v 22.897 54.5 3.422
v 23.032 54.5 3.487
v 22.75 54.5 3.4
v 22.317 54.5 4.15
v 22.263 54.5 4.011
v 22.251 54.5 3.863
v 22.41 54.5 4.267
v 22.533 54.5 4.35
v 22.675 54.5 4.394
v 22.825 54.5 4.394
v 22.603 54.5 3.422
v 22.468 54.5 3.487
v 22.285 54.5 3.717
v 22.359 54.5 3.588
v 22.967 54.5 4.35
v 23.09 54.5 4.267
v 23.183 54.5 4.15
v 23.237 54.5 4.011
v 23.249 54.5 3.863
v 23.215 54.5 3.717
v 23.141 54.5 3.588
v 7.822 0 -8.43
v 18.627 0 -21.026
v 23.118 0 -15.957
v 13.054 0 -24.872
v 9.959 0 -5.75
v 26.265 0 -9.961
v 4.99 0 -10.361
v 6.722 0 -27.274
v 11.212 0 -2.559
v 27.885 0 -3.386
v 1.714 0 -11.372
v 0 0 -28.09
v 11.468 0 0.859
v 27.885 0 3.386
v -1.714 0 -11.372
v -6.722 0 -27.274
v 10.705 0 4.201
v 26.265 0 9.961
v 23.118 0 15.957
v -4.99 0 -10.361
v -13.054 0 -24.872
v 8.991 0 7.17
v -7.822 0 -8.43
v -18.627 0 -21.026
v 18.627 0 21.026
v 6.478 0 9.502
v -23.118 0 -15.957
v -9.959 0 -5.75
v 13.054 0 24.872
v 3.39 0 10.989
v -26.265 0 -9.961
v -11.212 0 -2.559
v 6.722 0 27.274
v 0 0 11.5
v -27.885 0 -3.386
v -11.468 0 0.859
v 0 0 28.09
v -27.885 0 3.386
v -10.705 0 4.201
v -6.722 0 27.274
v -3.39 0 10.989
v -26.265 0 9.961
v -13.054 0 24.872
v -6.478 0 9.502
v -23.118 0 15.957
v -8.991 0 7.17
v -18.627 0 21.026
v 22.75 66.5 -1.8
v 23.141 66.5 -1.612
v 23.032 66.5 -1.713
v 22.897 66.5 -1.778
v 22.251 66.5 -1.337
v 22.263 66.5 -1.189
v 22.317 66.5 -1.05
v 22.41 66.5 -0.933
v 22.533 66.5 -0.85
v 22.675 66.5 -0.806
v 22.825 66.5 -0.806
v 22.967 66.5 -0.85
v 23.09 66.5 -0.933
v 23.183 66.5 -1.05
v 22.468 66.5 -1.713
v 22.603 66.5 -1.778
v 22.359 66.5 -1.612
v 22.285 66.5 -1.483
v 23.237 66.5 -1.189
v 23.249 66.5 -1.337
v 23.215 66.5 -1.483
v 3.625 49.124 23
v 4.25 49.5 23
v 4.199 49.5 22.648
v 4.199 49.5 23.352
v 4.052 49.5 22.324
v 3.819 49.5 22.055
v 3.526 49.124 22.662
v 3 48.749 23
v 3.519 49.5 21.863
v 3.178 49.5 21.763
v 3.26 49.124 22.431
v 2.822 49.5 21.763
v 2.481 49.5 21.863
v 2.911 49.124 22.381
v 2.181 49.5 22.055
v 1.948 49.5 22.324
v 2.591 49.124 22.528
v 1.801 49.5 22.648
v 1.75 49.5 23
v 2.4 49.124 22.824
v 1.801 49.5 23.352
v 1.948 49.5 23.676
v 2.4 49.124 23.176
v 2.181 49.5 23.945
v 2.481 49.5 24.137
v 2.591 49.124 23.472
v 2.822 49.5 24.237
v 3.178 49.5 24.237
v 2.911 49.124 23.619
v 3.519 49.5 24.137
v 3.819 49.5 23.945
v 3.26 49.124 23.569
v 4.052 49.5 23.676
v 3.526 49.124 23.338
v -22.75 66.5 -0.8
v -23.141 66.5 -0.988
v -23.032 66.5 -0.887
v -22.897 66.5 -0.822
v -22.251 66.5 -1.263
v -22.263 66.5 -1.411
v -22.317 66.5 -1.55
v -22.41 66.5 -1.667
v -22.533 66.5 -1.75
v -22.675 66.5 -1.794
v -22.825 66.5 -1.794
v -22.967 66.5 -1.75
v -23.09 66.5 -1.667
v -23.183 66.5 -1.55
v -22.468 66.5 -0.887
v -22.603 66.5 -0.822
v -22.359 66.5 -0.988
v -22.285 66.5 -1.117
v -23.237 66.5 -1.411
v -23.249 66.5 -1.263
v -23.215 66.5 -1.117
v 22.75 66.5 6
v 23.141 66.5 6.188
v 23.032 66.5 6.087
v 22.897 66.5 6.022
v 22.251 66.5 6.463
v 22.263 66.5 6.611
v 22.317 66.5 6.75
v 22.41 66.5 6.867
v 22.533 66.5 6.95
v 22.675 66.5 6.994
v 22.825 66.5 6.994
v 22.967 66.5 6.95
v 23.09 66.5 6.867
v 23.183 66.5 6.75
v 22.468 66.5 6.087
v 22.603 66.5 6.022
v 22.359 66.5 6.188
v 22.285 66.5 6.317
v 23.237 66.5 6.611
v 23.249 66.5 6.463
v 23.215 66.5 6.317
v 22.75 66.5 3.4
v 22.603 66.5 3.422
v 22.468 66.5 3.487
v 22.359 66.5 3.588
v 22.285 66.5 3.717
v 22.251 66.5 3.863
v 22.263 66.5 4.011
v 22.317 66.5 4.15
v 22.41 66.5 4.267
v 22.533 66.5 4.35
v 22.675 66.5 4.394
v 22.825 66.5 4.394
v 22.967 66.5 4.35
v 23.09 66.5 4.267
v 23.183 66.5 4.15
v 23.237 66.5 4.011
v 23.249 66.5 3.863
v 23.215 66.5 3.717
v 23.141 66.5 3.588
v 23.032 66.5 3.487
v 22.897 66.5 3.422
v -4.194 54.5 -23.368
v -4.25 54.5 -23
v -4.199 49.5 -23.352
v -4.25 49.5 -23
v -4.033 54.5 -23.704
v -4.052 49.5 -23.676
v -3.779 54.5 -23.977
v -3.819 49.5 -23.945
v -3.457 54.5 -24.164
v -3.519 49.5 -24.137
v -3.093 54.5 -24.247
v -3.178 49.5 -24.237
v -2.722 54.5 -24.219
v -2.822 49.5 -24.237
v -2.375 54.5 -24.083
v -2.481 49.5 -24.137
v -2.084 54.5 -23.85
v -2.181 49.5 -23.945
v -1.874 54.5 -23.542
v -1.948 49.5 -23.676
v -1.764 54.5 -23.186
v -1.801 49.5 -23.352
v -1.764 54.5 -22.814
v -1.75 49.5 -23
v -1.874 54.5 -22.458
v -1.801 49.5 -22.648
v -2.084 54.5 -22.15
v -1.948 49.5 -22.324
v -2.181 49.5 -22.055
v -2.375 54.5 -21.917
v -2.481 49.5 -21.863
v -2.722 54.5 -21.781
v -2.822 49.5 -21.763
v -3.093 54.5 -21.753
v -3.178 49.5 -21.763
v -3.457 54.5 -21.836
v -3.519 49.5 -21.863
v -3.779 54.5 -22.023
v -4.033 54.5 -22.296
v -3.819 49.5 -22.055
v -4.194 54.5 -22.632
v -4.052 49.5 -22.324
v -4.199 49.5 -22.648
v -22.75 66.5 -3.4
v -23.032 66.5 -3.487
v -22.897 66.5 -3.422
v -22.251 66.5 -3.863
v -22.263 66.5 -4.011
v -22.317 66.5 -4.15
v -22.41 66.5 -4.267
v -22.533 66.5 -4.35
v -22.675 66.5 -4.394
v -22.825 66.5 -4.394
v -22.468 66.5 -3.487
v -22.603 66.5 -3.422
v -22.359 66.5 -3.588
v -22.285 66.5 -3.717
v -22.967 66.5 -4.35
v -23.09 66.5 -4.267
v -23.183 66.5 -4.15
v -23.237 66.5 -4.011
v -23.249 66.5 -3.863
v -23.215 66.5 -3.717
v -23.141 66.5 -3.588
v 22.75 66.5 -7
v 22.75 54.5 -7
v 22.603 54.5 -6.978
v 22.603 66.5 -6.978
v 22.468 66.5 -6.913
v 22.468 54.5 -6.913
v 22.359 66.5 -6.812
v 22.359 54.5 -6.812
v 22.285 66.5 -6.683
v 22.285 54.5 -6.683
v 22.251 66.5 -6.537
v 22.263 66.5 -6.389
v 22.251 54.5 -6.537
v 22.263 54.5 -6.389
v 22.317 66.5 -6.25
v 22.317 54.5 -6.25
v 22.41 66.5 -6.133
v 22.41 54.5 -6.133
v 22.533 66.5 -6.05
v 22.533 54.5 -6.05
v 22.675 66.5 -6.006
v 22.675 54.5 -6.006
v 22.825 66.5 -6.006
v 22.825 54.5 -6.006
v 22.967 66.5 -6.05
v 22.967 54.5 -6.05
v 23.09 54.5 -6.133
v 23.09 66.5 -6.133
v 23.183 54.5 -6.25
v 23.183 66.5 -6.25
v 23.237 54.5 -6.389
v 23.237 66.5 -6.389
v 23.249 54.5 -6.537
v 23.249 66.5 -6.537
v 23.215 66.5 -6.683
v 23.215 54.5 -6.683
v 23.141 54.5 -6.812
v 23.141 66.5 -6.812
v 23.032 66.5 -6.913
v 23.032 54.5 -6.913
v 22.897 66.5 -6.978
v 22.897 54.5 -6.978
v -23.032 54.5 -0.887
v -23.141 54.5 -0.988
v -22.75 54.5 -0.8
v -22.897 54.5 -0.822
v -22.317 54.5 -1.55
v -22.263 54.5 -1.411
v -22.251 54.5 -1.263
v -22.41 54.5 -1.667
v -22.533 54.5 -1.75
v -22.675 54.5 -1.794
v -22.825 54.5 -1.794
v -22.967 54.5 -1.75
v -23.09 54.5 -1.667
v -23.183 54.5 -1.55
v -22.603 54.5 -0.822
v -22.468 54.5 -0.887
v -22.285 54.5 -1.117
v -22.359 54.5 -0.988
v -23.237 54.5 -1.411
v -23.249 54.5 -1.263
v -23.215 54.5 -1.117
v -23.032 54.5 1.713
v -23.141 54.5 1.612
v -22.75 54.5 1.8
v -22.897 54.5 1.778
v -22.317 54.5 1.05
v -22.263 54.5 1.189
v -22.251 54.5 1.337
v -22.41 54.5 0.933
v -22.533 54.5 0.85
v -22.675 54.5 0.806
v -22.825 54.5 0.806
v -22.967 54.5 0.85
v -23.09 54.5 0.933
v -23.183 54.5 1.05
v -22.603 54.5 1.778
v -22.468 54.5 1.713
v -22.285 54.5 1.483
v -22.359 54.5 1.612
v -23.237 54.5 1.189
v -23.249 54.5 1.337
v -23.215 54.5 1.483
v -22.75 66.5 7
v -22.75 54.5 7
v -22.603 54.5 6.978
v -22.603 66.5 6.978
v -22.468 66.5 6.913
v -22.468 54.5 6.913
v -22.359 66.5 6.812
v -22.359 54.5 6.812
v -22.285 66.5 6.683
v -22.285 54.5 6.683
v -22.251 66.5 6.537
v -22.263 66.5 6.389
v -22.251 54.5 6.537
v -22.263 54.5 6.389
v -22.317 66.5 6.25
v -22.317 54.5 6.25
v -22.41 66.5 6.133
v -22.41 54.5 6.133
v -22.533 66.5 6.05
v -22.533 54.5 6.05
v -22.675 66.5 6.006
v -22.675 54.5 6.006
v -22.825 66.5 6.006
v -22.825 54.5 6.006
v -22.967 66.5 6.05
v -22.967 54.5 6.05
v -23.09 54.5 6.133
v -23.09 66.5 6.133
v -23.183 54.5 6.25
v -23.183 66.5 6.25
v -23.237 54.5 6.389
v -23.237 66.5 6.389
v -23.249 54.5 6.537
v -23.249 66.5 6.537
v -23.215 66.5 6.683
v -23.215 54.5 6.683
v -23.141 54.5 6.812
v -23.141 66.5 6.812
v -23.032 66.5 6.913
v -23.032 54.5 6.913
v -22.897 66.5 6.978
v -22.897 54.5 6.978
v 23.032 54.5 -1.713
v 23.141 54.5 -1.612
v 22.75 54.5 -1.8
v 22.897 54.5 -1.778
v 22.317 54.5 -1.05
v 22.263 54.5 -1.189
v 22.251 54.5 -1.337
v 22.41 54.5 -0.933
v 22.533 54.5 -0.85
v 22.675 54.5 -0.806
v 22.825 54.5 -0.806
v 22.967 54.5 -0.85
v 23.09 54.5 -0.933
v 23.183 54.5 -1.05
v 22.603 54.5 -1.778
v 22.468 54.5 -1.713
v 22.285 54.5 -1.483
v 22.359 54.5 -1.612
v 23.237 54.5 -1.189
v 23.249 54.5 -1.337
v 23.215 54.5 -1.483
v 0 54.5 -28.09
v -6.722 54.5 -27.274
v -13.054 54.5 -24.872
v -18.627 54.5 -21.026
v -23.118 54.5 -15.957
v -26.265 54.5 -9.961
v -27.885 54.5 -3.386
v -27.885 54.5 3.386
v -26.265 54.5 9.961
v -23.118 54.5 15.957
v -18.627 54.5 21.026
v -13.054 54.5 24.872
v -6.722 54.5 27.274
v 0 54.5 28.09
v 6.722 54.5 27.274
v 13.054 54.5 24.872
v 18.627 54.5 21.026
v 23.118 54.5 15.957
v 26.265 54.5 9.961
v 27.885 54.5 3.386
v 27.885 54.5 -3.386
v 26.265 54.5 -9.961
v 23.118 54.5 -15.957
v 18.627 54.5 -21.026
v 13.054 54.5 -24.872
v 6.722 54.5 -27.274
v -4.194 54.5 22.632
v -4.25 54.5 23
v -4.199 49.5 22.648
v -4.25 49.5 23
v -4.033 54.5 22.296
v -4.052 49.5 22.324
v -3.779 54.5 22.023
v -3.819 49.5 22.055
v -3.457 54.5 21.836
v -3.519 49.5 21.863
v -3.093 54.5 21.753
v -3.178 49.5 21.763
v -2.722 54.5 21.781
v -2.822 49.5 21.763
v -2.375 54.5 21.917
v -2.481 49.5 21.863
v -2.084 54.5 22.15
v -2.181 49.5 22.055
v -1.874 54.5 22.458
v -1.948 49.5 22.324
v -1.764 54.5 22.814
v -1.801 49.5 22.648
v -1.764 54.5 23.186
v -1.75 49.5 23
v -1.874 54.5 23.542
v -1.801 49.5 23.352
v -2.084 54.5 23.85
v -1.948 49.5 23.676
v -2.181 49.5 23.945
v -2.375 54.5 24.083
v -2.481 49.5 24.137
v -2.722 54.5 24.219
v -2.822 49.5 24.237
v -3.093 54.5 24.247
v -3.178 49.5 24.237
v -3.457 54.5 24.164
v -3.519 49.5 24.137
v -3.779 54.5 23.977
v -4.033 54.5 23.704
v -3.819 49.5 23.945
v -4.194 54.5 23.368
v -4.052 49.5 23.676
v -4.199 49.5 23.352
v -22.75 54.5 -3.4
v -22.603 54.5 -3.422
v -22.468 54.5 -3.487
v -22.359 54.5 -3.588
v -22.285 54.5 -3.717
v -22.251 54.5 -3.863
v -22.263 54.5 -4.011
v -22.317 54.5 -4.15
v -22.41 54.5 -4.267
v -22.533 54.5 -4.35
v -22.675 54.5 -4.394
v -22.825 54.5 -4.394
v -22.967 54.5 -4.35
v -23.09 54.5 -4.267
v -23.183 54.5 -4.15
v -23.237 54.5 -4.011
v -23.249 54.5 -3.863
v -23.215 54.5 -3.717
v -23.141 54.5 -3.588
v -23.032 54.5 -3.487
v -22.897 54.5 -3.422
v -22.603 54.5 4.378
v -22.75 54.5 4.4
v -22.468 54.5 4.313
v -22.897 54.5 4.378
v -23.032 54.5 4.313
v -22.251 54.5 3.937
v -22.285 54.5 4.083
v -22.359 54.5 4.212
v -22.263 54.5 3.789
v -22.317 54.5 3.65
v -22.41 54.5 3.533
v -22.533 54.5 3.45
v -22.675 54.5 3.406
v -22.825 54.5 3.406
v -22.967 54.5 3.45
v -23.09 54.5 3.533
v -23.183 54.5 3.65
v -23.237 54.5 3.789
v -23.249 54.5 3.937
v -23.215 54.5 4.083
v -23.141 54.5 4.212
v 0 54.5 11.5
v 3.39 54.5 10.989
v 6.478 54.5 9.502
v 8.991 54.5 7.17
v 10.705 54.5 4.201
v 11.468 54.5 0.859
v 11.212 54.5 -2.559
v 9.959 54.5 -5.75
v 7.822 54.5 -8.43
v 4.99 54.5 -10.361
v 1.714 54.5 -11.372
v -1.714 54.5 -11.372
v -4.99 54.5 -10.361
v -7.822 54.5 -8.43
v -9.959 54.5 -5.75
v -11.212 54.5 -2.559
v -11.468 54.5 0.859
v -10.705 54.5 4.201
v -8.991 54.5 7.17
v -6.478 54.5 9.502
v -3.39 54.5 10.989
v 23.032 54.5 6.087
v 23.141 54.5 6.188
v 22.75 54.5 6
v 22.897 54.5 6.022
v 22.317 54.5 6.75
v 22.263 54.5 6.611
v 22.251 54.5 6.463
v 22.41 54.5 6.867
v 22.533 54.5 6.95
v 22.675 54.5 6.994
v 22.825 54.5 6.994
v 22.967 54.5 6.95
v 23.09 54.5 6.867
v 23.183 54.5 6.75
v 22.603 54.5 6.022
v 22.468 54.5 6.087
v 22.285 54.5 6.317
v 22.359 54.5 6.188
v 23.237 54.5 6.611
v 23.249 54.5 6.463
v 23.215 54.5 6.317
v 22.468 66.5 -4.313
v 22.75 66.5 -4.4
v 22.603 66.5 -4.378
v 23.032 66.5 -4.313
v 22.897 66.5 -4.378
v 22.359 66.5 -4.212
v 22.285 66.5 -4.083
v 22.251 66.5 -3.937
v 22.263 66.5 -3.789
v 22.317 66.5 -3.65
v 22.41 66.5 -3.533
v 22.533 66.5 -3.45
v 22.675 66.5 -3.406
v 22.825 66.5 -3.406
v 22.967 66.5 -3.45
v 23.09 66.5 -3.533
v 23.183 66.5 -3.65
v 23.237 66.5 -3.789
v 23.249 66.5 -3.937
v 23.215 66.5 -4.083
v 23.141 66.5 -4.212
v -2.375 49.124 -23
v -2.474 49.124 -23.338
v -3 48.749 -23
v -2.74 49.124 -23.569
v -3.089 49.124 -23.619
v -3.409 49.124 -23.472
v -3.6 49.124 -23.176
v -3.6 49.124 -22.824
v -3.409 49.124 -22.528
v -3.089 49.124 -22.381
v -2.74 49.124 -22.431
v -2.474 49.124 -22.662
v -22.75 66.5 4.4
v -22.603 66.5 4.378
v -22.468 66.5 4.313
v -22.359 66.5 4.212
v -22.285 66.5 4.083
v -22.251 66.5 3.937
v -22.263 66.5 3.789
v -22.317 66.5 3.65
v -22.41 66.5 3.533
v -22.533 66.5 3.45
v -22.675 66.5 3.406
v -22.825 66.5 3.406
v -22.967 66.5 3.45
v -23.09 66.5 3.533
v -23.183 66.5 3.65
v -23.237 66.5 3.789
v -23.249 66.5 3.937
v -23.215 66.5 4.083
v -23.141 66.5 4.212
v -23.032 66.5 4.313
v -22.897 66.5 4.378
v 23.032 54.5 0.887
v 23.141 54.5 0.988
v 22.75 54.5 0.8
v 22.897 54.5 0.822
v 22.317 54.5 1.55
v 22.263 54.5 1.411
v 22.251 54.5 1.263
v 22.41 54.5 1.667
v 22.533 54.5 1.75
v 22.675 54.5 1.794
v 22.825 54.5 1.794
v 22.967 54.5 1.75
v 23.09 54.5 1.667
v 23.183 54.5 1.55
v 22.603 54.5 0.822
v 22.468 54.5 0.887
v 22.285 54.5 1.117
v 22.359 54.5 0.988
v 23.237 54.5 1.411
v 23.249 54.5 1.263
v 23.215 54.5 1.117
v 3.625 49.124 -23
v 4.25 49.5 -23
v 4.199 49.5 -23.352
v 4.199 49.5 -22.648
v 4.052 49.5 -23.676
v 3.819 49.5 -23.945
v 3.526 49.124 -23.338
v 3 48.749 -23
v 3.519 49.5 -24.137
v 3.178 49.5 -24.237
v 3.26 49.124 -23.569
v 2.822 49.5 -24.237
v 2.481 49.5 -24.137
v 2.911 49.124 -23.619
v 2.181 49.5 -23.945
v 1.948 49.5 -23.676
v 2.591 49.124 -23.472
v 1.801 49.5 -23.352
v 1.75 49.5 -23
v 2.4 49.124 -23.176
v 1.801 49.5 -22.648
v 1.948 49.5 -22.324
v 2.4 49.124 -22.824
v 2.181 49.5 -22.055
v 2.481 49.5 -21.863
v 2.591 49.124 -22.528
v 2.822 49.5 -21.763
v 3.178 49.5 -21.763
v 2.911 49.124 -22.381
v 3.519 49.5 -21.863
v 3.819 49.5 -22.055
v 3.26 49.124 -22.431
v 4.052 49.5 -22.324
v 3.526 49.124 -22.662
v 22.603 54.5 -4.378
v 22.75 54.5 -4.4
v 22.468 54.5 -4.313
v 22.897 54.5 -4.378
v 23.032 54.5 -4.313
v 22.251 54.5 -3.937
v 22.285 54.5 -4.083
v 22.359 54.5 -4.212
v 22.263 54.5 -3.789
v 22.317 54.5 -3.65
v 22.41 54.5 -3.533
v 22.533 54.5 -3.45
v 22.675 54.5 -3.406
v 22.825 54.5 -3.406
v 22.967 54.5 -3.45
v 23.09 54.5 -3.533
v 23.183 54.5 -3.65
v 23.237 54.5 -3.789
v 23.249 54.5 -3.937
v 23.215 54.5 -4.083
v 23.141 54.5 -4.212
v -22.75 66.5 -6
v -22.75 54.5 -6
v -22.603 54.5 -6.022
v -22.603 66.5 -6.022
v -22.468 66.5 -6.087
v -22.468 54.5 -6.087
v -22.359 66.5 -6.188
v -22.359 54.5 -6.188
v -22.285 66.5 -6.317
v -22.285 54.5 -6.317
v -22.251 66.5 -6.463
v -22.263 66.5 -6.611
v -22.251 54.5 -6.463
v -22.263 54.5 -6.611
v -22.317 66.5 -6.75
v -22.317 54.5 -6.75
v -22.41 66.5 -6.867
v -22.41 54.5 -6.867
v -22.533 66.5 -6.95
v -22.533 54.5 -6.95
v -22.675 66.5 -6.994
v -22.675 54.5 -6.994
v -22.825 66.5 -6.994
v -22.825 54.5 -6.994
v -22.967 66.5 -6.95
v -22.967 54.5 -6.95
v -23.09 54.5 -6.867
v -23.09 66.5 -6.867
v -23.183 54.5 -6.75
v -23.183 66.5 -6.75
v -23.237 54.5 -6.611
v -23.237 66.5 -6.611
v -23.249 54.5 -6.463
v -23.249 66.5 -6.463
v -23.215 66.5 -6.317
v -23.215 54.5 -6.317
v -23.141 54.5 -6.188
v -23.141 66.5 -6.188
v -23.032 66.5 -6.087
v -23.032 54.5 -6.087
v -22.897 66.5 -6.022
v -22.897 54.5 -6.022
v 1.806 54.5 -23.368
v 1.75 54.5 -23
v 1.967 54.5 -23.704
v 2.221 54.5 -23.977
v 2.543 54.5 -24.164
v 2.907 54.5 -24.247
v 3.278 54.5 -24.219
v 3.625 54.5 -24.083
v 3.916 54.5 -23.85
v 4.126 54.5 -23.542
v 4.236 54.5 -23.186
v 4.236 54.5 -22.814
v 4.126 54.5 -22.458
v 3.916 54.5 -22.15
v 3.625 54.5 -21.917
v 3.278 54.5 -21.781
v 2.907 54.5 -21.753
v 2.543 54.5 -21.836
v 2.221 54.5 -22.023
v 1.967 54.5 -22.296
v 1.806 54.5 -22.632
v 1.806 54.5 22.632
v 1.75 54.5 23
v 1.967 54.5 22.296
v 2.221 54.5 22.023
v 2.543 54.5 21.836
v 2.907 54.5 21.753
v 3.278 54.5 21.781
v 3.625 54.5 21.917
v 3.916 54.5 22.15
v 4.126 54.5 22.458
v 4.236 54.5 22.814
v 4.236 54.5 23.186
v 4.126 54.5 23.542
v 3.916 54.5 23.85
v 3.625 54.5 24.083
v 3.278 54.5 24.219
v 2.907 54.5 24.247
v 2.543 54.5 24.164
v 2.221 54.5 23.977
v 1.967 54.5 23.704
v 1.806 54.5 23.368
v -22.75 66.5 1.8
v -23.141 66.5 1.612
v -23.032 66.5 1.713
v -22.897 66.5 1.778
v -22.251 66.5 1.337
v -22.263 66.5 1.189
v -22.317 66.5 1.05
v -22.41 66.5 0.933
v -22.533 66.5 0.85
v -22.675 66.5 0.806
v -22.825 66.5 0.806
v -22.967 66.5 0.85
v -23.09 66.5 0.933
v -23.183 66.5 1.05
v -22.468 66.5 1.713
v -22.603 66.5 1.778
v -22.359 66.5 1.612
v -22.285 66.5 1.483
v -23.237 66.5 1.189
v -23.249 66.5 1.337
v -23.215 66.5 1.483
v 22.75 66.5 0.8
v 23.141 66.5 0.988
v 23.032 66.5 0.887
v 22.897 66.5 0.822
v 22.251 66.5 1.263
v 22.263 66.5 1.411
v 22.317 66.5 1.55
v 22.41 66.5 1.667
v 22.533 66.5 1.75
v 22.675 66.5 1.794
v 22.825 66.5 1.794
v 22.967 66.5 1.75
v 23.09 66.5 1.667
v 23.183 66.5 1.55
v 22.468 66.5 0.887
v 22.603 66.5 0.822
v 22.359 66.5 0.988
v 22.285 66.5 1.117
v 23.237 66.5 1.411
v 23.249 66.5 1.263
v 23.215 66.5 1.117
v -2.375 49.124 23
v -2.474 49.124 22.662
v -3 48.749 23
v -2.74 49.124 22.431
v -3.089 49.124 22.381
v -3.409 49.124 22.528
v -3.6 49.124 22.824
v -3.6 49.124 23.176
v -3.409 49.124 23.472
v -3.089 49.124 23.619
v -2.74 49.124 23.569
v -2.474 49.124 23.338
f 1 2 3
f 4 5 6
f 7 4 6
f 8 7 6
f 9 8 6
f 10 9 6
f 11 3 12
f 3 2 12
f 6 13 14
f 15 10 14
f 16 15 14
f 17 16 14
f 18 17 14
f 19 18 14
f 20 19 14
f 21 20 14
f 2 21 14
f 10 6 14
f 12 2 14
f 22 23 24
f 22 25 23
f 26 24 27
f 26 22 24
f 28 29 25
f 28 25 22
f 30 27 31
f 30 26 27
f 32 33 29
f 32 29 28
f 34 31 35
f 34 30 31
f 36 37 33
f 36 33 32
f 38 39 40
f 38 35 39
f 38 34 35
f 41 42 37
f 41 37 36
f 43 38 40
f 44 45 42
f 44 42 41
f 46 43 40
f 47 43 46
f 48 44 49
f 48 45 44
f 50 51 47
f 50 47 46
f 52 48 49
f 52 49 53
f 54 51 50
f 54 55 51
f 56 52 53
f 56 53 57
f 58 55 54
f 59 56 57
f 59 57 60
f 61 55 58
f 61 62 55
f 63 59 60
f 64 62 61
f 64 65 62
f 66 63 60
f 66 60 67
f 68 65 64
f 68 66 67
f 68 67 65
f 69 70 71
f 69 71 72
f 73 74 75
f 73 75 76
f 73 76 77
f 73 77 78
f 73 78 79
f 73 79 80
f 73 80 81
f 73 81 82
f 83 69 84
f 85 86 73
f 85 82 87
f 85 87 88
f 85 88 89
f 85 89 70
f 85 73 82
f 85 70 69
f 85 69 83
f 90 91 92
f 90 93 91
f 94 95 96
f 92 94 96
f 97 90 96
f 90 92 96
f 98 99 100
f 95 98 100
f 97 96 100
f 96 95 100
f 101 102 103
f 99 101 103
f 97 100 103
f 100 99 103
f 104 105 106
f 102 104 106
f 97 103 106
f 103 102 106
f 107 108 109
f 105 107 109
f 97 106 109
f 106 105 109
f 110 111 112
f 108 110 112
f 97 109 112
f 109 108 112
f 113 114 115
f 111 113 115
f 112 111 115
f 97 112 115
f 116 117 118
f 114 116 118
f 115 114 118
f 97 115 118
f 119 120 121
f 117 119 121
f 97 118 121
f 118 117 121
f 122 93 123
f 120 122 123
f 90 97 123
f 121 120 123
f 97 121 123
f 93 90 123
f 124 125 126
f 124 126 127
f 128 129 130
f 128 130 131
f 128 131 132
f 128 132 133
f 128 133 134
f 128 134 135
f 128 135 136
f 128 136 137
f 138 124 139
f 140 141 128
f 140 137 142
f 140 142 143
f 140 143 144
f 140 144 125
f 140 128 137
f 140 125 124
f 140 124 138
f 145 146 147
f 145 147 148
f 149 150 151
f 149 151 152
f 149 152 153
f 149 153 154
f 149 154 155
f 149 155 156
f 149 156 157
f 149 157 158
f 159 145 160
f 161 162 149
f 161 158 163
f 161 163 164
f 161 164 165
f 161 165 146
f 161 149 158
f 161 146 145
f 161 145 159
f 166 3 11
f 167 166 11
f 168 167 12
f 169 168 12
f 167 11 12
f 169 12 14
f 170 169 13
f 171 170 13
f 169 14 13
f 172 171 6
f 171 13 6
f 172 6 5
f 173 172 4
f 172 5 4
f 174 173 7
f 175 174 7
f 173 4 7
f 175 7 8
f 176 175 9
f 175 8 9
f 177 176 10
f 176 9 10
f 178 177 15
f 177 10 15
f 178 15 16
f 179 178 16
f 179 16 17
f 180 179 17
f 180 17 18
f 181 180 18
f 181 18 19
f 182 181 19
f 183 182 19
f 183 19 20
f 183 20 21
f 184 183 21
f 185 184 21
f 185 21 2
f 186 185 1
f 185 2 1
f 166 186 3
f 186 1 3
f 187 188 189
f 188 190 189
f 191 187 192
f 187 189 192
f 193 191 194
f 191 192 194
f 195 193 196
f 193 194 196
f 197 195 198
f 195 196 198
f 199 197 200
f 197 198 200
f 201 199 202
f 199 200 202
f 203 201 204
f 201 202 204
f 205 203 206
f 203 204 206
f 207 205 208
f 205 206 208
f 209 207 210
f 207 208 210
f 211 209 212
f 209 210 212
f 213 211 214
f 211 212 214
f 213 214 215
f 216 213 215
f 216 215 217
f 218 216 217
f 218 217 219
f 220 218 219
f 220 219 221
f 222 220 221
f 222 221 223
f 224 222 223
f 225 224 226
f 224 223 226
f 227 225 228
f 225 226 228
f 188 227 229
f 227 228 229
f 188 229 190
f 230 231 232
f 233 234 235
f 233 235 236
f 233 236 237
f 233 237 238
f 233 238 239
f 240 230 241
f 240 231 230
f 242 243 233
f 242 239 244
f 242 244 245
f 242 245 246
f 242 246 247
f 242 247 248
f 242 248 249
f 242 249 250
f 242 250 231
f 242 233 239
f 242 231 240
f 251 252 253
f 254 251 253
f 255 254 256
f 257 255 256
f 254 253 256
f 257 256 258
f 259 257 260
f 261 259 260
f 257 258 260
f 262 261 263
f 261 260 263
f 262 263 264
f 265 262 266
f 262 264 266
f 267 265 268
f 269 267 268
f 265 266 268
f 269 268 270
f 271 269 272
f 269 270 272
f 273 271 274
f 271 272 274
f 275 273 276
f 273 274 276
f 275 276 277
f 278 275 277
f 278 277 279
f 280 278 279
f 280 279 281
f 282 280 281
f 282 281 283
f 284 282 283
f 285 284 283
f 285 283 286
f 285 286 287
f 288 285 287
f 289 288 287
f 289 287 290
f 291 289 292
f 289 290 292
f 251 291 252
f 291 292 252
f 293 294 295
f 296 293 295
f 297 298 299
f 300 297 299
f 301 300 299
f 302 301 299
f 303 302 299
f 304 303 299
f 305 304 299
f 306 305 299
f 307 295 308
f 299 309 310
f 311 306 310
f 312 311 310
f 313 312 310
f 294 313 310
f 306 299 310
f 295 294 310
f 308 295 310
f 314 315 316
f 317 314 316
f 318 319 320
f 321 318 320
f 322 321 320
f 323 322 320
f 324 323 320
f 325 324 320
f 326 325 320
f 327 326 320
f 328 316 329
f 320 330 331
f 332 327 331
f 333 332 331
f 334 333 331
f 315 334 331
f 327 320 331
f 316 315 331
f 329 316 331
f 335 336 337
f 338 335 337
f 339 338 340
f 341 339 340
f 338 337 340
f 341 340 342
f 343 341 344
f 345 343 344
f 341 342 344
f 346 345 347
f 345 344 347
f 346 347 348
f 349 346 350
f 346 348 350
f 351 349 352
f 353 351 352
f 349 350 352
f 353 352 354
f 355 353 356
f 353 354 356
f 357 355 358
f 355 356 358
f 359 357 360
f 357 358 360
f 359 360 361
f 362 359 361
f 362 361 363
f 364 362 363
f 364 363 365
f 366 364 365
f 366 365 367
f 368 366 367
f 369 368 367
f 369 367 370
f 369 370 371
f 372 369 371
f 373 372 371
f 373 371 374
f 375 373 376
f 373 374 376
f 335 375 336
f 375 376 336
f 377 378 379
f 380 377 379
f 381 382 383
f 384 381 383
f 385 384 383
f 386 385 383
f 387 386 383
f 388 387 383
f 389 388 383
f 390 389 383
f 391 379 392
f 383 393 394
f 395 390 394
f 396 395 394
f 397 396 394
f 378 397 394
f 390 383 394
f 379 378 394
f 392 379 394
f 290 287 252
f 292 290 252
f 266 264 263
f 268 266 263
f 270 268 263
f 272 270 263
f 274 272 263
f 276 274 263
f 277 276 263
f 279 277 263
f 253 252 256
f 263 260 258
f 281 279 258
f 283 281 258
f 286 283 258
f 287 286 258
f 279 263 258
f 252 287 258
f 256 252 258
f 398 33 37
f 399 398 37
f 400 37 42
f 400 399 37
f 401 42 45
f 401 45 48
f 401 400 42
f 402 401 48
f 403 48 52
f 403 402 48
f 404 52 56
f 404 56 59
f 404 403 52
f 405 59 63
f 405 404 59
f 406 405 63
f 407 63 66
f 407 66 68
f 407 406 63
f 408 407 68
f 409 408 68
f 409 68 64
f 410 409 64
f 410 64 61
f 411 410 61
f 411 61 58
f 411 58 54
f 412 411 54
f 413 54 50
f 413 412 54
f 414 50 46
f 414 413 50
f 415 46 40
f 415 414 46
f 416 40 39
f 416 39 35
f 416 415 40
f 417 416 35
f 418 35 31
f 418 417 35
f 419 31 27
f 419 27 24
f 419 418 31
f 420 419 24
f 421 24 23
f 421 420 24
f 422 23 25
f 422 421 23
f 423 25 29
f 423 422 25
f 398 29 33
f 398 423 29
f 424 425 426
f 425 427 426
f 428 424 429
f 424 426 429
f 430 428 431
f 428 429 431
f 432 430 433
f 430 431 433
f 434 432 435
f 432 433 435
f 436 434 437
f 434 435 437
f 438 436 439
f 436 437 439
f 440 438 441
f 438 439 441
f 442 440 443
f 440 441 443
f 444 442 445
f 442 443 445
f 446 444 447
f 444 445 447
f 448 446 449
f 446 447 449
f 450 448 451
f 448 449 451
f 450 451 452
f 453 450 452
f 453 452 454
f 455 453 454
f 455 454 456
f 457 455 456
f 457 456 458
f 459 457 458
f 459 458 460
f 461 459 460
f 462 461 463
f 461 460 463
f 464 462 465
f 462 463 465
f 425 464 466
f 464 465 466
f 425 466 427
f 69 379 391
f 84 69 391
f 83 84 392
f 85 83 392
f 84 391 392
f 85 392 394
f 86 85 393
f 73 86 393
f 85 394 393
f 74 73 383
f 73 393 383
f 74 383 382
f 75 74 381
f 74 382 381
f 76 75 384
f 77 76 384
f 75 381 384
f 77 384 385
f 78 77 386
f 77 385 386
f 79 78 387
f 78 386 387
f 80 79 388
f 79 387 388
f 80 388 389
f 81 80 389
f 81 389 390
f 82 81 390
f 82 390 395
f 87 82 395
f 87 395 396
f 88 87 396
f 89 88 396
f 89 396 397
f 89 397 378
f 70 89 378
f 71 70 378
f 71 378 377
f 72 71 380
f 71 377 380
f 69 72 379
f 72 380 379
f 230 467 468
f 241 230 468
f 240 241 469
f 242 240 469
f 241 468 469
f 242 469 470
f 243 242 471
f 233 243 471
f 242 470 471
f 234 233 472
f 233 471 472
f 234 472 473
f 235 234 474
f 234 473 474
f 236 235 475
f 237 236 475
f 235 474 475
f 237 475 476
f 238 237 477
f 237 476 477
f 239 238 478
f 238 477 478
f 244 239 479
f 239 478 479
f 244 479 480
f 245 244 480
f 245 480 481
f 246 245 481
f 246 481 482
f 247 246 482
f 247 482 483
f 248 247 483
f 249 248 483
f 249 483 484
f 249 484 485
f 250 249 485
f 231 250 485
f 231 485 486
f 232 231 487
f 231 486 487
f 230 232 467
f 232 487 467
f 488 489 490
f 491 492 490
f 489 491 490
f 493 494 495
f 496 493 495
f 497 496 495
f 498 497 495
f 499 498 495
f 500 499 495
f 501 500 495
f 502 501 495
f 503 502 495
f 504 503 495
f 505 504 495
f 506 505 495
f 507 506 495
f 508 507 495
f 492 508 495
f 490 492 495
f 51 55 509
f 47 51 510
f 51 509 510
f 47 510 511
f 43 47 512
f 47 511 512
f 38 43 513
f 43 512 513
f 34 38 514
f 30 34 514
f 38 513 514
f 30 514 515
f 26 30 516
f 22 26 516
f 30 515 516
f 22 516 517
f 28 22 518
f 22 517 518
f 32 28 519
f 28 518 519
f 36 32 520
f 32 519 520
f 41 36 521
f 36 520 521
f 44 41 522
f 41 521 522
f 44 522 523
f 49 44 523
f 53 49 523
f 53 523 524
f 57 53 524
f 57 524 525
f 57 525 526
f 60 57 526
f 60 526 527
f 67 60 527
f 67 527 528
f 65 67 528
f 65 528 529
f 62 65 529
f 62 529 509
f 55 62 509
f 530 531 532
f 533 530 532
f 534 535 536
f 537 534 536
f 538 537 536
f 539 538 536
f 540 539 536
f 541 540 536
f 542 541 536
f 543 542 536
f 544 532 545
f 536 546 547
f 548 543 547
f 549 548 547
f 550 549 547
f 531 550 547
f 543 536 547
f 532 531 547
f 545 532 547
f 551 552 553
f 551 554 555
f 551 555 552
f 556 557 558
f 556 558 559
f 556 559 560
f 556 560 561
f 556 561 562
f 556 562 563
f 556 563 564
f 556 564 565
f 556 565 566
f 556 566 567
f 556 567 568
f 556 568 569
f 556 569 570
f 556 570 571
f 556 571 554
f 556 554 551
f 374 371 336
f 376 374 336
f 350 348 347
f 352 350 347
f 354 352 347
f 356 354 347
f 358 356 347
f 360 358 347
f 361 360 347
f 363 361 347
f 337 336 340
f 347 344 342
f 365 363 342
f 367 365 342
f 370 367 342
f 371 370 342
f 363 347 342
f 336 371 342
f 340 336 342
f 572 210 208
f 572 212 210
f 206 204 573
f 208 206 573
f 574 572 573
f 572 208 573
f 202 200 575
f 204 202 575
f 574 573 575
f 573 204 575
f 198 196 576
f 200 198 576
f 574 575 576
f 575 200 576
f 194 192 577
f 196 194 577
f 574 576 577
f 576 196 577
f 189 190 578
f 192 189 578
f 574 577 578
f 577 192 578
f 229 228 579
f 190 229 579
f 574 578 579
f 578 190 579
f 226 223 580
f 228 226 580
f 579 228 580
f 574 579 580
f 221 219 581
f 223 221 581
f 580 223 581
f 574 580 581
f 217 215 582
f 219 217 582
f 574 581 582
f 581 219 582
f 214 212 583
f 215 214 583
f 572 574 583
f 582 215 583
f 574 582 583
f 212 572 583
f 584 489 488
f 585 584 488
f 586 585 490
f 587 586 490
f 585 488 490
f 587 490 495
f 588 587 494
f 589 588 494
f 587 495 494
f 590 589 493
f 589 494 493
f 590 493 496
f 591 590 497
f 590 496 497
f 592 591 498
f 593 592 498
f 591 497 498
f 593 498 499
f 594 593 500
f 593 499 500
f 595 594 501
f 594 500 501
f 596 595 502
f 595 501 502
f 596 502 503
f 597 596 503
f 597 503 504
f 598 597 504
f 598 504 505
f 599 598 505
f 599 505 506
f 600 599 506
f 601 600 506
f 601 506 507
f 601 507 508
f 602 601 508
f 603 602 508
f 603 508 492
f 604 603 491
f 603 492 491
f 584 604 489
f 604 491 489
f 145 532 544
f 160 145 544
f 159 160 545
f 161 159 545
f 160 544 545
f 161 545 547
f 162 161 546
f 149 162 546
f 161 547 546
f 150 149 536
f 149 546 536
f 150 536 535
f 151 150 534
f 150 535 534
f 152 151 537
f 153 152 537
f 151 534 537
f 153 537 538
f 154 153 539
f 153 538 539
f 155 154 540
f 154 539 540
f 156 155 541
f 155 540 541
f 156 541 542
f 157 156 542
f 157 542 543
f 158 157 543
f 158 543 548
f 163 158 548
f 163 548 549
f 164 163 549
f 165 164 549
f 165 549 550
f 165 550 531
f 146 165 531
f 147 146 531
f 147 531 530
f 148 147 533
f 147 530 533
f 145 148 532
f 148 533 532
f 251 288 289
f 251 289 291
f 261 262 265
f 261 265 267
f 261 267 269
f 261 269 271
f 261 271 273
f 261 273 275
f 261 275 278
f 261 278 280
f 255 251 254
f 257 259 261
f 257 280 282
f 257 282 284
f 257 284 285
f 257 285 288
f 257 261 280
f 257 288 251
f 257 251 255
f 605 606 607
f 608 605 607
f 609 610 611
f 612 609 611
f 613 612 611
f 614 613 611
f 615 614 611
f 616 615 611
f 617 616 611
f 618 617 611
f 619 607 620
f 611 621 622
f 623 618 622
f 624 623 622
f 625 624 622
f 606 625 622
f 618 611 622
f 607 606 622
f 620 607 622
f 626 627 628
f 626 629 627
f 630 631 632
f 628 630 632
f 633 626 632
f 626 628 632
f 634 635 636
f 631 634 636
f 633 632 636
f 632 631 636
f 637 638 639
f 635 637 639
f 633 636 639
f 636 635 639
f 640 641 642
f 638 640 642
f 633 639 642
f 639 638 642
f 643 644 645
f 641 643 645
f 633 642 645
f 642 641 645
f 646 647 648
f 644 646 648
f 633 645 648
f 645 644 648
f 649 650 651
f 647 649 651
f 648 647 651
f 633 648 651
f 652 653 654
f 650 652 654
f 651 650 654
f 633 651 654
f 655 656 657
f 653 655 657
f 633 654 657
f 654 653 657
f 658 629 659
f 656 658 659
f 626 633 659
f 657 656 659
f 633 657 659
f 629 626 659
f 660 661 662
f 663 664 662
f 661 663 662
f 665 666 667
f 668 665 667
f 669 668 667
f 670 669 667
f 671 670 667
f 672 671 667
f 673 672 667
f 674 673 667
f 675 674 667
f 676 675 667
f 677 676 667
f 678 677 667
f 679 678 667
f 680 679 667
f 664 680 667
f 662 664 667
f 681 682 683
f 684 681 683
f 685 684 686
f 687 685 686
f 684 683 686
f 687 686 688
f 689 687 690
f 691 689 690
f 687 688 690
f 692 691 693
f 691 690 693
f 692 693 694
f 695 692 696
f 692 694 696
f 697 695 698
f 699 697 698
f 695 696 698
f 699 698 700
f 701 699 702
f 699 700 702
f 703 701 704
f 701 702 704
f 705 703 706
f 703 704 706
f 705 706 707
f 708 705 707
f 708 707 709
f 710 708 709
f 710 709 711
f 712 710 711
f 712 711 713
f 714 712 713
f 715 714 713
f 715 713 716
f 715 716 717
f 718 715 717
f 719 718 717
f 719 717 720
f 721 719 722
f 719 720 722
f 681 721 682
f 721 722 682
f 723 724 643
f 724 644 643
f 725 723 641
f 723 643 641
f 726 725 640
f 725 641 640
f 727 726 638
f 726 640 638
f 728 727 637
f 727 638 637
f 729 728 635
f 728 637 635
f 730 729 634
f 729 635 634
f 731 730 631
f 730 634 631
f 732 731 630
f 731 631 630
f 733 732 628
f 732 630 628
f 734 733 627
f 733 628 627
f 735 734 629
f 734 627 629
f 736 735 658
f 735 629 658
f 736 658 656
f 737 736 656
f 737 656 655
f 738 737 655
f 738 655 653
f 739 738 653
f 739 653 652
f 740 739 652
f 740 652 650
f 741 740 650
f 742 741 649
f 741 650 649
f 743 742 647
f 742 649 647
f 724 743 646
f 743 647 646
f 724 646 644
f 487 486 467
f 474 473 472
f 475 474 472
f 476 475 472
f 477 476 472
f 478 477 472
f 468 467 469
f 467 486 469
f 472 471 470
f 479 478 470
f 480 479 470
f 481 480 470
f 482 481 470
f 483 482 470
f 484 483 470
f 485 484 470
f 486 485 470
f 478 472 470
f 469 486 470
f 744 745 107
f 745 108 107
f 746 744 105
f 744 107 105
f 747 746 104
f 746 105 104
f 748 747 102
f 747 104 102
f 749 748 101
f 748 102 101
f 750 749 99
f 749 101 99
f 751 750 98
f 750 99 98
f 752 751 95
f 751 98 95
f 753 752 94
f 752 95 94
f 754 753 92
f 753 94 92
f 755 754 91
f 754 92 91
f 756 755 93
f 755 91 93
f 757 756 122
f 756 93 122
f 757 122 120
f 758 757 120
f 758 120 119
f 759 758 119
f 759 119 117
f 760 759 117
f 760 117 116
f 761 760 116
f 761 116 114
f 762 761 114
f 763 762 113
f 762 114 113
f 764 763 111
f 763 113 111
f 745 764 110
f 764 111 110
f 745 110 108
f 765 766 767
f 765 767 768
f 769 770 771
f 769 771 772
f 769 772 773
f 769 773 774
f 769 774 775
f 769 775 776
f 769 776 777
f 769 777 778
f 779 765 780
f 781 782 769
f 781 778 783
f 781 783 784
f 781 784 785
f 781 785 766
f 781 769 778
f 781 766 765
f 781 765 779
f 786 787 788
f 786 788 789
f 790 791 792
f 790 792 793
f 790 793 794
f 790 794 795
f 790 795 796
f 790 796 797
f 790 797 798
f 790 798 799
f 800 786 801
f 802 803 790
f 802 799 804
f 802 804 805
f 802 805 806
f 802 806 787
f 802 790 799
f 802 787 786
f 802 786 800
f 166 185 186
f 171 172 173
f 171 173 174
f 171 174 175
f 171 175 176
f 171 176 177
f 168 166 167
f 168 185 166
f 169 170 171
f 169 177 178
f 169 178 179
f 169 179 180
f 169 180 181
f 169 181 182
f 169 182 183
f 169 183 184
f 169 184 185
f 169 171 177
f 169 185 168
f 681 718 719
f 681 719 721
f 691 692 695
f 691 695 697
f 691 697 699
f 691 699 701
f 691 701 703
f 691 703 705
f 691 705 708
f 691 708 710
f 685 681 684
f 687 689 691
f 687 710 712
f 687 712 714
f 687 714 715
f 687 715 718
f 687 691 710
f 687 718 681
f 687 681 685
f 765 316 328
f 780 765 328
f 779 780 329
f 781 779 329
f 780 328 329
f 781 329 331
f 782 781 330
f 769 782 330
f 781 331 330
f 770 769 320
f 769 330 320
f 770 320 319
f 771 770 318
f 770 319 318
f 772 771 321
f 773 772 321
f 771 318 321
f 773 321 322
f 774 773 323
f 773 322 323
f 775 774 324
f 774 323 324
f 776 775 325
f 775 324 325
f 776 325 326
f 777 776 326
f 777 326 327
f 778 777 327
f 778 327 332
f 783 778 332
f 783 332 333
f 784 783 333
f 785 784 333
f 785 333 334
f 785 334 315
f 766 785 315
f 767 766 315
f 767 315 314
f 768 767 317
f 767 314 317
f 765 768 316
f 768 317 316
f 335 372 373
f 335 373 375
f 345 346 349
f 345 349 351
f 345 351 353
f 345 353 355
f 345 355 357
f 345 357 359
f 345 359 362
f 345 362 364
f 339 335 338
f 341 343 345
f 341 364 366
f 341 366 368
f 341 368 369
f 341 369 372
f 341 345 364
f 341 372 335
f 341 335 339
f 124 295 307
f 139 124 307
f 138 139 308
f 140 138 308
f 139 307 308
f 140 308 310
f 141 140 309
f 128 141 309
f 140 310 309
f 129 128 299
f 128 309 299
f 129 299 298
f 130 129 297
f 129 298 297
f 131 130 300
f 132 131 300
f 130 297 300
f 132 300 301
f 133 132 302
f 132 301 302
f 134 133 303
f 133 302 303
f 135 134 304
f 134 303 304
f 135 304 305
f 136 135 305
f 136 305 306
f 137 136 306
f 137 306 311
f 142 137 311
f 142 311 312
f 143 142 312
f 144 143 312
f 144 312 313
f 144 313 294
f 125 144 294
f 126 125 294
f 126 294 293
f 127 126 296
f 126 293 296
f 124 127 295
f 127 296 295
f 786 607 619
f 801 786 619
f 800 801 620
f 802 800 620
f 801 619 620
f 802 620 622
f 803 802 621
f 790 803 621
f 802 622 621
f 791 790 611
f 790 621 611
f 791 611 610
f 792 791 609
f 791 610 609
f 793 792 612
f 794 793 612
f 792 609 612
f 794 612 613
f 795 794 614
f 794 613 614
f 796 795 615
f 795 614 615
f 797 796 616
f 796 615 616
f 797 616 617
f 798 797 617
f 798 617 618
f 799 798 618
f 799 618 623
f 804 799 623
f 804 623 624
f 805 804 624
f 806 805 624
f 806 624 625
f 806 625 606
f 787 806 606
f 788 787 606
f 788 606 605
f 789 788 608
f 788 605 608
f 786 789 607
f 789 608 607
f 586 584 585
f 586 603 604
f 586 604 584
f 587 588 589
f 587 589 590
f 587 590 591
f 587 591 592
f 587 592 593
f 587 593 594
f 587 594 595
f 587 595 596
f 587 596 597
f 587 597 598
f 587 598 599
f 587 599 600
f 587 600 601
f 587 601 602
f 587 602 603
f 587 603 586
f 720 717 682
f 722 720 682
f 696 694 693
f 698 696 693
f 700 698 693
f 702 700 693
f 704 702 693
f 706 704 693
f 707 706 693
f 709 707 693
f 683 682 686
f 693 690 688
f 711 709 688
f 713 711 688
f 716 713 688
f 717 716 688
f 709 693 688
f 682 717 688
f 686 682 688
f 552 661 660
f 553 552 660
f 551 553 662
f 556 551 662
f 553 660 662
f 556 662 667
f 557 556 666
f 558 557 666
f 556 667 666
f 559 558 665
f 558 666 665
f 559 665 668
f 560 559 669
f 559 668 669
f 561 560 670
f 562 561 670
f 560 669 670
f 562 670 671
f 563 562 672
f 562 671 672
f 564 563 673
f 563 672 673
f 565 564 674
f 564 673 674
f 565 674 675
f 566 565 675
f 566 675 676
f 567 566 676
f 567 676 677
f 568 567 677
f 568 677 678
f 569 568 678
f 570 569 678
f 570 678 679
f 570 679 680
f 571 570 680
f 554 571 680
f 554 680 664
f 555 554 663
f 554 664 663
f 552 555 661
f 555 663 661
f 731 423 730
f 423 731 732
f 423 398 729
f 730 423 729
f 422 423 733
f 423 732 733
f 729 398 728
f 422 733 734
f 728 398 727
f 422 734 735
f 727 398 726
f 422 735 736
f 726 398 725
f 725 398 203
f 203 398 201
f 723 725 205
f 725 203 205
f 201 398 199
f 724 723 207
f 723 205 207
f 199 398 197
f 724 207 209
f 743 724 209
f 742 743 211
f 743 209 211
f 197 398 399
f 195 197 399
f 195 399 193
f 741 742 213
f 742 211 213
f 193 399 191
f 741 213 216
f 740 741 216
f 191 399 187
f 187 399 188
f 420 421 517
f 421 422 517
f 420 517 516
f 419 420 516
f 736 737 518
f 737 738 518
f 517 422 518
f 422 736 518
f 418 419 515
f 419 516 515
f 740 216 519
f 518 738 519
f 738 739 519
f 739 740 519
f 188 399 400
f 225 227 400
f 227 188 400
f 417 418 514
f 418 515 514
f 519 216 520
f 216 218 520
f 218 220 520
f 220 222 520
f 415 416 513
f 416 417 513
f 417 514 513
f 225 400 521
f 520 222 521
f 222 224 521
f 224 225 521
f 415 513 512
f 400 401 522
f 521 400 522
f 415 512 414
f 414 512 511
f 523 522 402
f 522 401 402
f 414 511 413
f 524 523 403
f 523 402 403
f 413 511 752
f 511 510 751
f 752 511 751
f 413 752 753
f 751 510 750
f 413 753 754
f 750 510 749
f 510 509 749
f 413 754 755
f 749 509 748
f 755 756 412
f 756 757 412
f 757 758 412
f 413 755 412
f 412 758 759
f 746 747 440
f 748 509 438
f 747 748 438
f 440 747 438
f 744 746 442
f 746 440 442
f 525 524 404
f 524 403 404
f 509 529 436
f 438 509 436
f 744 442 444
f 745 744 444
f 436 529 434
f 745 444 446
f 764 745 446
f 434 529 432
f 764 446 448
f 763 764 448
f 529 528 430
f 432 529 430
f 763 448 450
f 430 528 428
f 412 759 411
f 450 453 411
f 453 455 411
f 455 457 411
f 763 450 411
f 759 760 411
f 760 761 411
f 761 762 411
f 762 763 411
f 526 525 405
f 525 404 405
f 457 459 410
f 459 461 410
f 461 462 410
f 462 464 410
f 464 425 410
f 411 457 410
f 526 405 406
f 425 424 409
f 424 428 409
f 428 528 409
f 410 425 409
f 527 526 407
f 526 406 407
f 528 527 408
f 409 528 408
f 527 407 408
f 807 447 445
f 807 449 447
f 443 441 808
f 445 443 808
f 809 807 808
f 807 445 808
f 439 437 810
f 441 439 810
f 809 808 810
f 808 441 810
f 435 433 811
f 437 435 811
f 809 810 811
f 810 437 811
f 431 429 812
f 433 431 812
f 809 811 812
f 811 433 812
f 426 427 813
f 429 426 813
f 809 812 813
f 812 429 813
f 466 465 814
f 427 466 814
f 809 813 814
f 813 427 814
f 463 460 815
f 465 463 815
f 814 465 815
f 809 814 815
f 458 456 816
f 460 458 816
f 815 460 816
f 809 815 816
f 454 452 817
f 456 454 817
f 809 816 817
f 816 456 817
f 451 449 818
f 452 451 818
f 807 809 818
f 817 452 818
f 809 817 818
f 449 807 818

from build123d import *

# Parameters (mm, degrees)
SKETCH1_W                 = 28.09
SKETCH1_H                 = 54.5
M3X0_5_TAPPED_HOLE1_D     = 2.5
M3X0_5_TAPPED_HOLE1_DEPTH = 4.99999
M3X0_5_TAPPED_HOLE1_TIP   = 0.751075774
SKETCH6_R                 = 0.5
BOSS_EXTRUDE1_DEPTH       = 12
BOSS_EXTRUDE1_2_DEPTH     = 12
BOSS_EXTRUDE1_3_DEPTH     = 12
BOSS_EXTRUDE1_4_DEPTH     = 12
BOSS_EXTRUDE1_5_DEPTH     = 12
BOSS_EXTRUDE1_6_DEPTH     = 12
BOSS_EXTRUDE1_7_DEPTH     = 12
BOSS_EXTRUDE1_8_DEPTH     = 12
BOSS_EXTRUDE1_9_DEPTH     = 12
BOSS_EXTRUDE1_10_DEPTH    = 12
BOSS_EXTRUDE1_11_DEPTH    = 12
BOSS_EXTRUDE1_12_DEPTH    = 12
SKETCH8_R                 = 11.5
CUT_EXTRUDE1_DEPTH        = 68.441427921


with BuildPart() as part:
    # Sketch1 → Revolve1 (revolve)
    with BuildSketch(Plane.XY, mode=Mode.PRIVATE) as revolve1_sk:
        with Locations((14.045, 27.25)):
            Rectangle(SKETCH1_W, SKETCH1_H)
    revolve(revolve1_sk.sketch.rotate(Axis((0, 0, 0), (0, 1, 0)), 90), axis=Axis((0, 0, 0), (0, 1, 0)))

    # Sketch3 → 1/4 NPT Tapped Hole1 (revolve, cut)
    with BuildSketch(Plane(origin=(0, 54.5, 0), x_dir=(0, 0, 1), z_dir=(1, 0, 0))):
        Polygon((0, 0), (0, 54.5), (5.5626, 54.5), (5.5626, 10.0203), (6.557978799, 10.0203), (6.858, 0), align=None)
    revolve(axis=Axis((0, 60.85, 0), (0, -1, 0)), mode=Mode.SUBTRACT)

    # M3x0.5 Tapped Hole1
    with Locations(Plane(origin=(0, 54.5, 0), x_dir=(1, 0, 0), z_dir=(0, 1, 0))):
        with Locations((-3, 23), (3, -23), (-3, -23), (3, 23)):
            Hole(M3X0_5_TAPPED_HOLE1_D / 2, depth=M3X0_5_TAPPED_HOLE1_DEPTH)
            with Locations((0, 0, -(M3X0_5_TAPPED_HOLE1_DEPTH + M3X0_5_TAPPED_HOLE1_TIP / 2))):  # 118° drill point
                Cone(0, M3X0_5_TAPPED_HOLE1_D / 2, M3X0_5_TAPPED_HOLE1_TIP, mode=Mode.SUBTRACT)

    # Sketch8 → Cut-Extrude1 (cut, through all)
    with BuildSketch(Plane(origin=(0, 54.5, 0), x_dir=(1, 0, 0), z_dir=(0, 1, 0))):
        with Locations(Location((0, 0, 0), (0, 0, 270))):
            Circle(SKETCH8_R)
    extrude(amount=-CUT_EXTRUDE1_DEPTH, mode=Mode.SUBTRACT)


with BuildPart() as body_2:
    # Sketch6 → Boss-Extrude1 (new body)
    with BuildSketch(Plane(origin=(0, 54.5, 0), x_dir=(1, 0, 0), z_dir=(0, 1, 0))):
        with Locations(Location((-22.75, 6.5, 0), (0, 0, 270))):
            Circle(SKETCH6_R)
    extrude(amount=BOSS_EXTRUDE1_DEPTH)


with BuildPart() as body_3:
    # Sketch6 → Boss-Extrude1 2 (new body)
    with BuildSketch(Plane(origin=(0, 54.5, 0), x_dir=(1, 0, 0), z_dir=(0, 1, 0))):
        with Locations(Location((-22.75, 3.9, 0), (0, 0, 270))):
            Circle(SKETCH6_R)
    extrude(amount=BOSS_EXTRUDE1_2_DEPTH)


with BuildPart() as body_4:
    # Sketch6 → Boss-Extrude1 3 (new body)
    with BuildSketch(Plane(origin=(0, 54.5, 0), x_dir=(1, 0, 0), z_dir=(0, 1, 0))):
        with Locations(Location((-22.75, 1.3, 0), (0, 0, 270))):
            Circle(SKETCH6_R)
    extrude(amount=BOSS_EXTRUDE1_3_DEPTH)


with BuildPart() as body_5:
    # Sketch6 → Boss-Extrude1 4 (new body)
    with BuildSketch(Plane(origin=(0, 54.5, 0), x_dir=(1, 0, 0), z_dir=(0, 1, 0))):
        with Locations(Location((-22.75, -1.3, 0), (0, 0, 270))):
            Circle(SKETCH6_R)
    extrude(amount=BOSS_EXTRUDE1_4_DEPTH)


with BuildPart() as body_6:
    # Sketch6 → Boss-Extrude1 5 (new body)
    with BuildSketch(Plane(origin=(0, 54.5, 0), x_dir=(1, 0, 0), z_dir=(0, 1, 0))):
        with Locations(Location((-22.75, -3.9, 0), (0, 0, 270))):
            Circle(SKETCH6_R)
    extrude(amount=BOSS_EXTRUDE1_5_DEPTH)


with BuildPart() as body_7:
    # Sketch6 → Boss-Extrude1 6 (new body)
    with BuildSketch(Plane(origin=(0, 54.5, 0), x_dir=(1, 0, 0), z_dir=(0, 1, 0))):
        with Locations(Location((-22.75, -6.5, 0), (0, 0, 270))):
            Circle(SKETCH6_R)
    extrude(amount=BOSS_EXTRUDE1_6_DEPTH)


with BuildPart() as body_8:
    # Sketch6 → Boss-Extrude1 7 (new body)
    with BuildSketch(Plane(origin=(0, 54.5, 0), x_dir=(1, 0, 0), z_dir=(0, 1, 0))):
        with Locations(Location((22.75, -6.5, 0), (0, 0, 90))):
            Circle(SKETCH6_R)
    extrude(amount=BOSS_EXTRUDE1_7_DEPTH)


with BuildPart() as body_9:
    # Sketch6 → Boss-Extrude1 8 (new body)
    with BuildSketch(Plane(origin=(0, 54.5, 0), x_dir=(1, 0, 0), z_dir=(0, 1, 0))):
        with Locations(Location((22.75, -3.9, 0), (0, 0, 90))):
            Circle(SKETCH6_R)
    extrude(amount=BOSS_EXTRUDE1_8_DEPTH)


with BuildPart() as body_10:
    # Sketch6 → Boss-Extrude1 9 (new body)
    with BuildSketch(Plane(origin=(0, 54.5, 0), x_dir=(1, 0, 0), z_dir=(0, 1, 0))):
        with Locations(Location((22.75, -1.3, 0), (0, 0, 90))):
            Circle(SKETCH6_R)
    extrude(amount=BOSS_EXTRUDE1_9_DEPTH)


with BuildPart() as body_11:
    # Sketch6 → Boss-Extrude1 10 (new body)
    with BuildSketch(Plane(origin=(0, 54.5, 0), x_dir=(1, 0, 0), z_dir=(0, 1, 0))):
        with Locations(Location((22.75, 1.3, 0), (0, 0, 90))):
            Circle(SKETCH6_R)
    extrude(amount=BOSS_EXTRUDE1_10_DEPTH)


with BuildPart() as body_12:
    # Sketch6 → Boss-Extrude1 11 (new body)
    with BuildSketch(Plane(origin=(0, 54.5, 0), x_dir=(1, 0, 0), z_dir=(0, 1, 0))):
        with Locations(Location((22.75, 3.9, 0), (0, 0, 90))):
            Circle(SKETCH6_R)
    extrude(amount=BOSS_EXTRUDE1_11_DEPTH)


with BuildPart() as body_13:
    # Sketch6 → Boss-Extrude1 12 (new body)
    with BuildSketch(Plane(origin=(0, 54.5, 0), x_dir=(1, 0, 0), z_dir=(0, 1, 0))):
        with Locations(Location((22.75, 6.5, 0), (0, 0, 90))):
            Circle(SKETCH6_R)
    extrude(amount=BOSS_EXTRUDE1_12_DEPTH)


solid = Compound([part.part, body_2.part, body_3.part, body_4.part, body_5.part, body_6.part, body_7.part, body_8.part, body_9.part, body_10.part, body_11.part, body_12.part, body_13.part])
